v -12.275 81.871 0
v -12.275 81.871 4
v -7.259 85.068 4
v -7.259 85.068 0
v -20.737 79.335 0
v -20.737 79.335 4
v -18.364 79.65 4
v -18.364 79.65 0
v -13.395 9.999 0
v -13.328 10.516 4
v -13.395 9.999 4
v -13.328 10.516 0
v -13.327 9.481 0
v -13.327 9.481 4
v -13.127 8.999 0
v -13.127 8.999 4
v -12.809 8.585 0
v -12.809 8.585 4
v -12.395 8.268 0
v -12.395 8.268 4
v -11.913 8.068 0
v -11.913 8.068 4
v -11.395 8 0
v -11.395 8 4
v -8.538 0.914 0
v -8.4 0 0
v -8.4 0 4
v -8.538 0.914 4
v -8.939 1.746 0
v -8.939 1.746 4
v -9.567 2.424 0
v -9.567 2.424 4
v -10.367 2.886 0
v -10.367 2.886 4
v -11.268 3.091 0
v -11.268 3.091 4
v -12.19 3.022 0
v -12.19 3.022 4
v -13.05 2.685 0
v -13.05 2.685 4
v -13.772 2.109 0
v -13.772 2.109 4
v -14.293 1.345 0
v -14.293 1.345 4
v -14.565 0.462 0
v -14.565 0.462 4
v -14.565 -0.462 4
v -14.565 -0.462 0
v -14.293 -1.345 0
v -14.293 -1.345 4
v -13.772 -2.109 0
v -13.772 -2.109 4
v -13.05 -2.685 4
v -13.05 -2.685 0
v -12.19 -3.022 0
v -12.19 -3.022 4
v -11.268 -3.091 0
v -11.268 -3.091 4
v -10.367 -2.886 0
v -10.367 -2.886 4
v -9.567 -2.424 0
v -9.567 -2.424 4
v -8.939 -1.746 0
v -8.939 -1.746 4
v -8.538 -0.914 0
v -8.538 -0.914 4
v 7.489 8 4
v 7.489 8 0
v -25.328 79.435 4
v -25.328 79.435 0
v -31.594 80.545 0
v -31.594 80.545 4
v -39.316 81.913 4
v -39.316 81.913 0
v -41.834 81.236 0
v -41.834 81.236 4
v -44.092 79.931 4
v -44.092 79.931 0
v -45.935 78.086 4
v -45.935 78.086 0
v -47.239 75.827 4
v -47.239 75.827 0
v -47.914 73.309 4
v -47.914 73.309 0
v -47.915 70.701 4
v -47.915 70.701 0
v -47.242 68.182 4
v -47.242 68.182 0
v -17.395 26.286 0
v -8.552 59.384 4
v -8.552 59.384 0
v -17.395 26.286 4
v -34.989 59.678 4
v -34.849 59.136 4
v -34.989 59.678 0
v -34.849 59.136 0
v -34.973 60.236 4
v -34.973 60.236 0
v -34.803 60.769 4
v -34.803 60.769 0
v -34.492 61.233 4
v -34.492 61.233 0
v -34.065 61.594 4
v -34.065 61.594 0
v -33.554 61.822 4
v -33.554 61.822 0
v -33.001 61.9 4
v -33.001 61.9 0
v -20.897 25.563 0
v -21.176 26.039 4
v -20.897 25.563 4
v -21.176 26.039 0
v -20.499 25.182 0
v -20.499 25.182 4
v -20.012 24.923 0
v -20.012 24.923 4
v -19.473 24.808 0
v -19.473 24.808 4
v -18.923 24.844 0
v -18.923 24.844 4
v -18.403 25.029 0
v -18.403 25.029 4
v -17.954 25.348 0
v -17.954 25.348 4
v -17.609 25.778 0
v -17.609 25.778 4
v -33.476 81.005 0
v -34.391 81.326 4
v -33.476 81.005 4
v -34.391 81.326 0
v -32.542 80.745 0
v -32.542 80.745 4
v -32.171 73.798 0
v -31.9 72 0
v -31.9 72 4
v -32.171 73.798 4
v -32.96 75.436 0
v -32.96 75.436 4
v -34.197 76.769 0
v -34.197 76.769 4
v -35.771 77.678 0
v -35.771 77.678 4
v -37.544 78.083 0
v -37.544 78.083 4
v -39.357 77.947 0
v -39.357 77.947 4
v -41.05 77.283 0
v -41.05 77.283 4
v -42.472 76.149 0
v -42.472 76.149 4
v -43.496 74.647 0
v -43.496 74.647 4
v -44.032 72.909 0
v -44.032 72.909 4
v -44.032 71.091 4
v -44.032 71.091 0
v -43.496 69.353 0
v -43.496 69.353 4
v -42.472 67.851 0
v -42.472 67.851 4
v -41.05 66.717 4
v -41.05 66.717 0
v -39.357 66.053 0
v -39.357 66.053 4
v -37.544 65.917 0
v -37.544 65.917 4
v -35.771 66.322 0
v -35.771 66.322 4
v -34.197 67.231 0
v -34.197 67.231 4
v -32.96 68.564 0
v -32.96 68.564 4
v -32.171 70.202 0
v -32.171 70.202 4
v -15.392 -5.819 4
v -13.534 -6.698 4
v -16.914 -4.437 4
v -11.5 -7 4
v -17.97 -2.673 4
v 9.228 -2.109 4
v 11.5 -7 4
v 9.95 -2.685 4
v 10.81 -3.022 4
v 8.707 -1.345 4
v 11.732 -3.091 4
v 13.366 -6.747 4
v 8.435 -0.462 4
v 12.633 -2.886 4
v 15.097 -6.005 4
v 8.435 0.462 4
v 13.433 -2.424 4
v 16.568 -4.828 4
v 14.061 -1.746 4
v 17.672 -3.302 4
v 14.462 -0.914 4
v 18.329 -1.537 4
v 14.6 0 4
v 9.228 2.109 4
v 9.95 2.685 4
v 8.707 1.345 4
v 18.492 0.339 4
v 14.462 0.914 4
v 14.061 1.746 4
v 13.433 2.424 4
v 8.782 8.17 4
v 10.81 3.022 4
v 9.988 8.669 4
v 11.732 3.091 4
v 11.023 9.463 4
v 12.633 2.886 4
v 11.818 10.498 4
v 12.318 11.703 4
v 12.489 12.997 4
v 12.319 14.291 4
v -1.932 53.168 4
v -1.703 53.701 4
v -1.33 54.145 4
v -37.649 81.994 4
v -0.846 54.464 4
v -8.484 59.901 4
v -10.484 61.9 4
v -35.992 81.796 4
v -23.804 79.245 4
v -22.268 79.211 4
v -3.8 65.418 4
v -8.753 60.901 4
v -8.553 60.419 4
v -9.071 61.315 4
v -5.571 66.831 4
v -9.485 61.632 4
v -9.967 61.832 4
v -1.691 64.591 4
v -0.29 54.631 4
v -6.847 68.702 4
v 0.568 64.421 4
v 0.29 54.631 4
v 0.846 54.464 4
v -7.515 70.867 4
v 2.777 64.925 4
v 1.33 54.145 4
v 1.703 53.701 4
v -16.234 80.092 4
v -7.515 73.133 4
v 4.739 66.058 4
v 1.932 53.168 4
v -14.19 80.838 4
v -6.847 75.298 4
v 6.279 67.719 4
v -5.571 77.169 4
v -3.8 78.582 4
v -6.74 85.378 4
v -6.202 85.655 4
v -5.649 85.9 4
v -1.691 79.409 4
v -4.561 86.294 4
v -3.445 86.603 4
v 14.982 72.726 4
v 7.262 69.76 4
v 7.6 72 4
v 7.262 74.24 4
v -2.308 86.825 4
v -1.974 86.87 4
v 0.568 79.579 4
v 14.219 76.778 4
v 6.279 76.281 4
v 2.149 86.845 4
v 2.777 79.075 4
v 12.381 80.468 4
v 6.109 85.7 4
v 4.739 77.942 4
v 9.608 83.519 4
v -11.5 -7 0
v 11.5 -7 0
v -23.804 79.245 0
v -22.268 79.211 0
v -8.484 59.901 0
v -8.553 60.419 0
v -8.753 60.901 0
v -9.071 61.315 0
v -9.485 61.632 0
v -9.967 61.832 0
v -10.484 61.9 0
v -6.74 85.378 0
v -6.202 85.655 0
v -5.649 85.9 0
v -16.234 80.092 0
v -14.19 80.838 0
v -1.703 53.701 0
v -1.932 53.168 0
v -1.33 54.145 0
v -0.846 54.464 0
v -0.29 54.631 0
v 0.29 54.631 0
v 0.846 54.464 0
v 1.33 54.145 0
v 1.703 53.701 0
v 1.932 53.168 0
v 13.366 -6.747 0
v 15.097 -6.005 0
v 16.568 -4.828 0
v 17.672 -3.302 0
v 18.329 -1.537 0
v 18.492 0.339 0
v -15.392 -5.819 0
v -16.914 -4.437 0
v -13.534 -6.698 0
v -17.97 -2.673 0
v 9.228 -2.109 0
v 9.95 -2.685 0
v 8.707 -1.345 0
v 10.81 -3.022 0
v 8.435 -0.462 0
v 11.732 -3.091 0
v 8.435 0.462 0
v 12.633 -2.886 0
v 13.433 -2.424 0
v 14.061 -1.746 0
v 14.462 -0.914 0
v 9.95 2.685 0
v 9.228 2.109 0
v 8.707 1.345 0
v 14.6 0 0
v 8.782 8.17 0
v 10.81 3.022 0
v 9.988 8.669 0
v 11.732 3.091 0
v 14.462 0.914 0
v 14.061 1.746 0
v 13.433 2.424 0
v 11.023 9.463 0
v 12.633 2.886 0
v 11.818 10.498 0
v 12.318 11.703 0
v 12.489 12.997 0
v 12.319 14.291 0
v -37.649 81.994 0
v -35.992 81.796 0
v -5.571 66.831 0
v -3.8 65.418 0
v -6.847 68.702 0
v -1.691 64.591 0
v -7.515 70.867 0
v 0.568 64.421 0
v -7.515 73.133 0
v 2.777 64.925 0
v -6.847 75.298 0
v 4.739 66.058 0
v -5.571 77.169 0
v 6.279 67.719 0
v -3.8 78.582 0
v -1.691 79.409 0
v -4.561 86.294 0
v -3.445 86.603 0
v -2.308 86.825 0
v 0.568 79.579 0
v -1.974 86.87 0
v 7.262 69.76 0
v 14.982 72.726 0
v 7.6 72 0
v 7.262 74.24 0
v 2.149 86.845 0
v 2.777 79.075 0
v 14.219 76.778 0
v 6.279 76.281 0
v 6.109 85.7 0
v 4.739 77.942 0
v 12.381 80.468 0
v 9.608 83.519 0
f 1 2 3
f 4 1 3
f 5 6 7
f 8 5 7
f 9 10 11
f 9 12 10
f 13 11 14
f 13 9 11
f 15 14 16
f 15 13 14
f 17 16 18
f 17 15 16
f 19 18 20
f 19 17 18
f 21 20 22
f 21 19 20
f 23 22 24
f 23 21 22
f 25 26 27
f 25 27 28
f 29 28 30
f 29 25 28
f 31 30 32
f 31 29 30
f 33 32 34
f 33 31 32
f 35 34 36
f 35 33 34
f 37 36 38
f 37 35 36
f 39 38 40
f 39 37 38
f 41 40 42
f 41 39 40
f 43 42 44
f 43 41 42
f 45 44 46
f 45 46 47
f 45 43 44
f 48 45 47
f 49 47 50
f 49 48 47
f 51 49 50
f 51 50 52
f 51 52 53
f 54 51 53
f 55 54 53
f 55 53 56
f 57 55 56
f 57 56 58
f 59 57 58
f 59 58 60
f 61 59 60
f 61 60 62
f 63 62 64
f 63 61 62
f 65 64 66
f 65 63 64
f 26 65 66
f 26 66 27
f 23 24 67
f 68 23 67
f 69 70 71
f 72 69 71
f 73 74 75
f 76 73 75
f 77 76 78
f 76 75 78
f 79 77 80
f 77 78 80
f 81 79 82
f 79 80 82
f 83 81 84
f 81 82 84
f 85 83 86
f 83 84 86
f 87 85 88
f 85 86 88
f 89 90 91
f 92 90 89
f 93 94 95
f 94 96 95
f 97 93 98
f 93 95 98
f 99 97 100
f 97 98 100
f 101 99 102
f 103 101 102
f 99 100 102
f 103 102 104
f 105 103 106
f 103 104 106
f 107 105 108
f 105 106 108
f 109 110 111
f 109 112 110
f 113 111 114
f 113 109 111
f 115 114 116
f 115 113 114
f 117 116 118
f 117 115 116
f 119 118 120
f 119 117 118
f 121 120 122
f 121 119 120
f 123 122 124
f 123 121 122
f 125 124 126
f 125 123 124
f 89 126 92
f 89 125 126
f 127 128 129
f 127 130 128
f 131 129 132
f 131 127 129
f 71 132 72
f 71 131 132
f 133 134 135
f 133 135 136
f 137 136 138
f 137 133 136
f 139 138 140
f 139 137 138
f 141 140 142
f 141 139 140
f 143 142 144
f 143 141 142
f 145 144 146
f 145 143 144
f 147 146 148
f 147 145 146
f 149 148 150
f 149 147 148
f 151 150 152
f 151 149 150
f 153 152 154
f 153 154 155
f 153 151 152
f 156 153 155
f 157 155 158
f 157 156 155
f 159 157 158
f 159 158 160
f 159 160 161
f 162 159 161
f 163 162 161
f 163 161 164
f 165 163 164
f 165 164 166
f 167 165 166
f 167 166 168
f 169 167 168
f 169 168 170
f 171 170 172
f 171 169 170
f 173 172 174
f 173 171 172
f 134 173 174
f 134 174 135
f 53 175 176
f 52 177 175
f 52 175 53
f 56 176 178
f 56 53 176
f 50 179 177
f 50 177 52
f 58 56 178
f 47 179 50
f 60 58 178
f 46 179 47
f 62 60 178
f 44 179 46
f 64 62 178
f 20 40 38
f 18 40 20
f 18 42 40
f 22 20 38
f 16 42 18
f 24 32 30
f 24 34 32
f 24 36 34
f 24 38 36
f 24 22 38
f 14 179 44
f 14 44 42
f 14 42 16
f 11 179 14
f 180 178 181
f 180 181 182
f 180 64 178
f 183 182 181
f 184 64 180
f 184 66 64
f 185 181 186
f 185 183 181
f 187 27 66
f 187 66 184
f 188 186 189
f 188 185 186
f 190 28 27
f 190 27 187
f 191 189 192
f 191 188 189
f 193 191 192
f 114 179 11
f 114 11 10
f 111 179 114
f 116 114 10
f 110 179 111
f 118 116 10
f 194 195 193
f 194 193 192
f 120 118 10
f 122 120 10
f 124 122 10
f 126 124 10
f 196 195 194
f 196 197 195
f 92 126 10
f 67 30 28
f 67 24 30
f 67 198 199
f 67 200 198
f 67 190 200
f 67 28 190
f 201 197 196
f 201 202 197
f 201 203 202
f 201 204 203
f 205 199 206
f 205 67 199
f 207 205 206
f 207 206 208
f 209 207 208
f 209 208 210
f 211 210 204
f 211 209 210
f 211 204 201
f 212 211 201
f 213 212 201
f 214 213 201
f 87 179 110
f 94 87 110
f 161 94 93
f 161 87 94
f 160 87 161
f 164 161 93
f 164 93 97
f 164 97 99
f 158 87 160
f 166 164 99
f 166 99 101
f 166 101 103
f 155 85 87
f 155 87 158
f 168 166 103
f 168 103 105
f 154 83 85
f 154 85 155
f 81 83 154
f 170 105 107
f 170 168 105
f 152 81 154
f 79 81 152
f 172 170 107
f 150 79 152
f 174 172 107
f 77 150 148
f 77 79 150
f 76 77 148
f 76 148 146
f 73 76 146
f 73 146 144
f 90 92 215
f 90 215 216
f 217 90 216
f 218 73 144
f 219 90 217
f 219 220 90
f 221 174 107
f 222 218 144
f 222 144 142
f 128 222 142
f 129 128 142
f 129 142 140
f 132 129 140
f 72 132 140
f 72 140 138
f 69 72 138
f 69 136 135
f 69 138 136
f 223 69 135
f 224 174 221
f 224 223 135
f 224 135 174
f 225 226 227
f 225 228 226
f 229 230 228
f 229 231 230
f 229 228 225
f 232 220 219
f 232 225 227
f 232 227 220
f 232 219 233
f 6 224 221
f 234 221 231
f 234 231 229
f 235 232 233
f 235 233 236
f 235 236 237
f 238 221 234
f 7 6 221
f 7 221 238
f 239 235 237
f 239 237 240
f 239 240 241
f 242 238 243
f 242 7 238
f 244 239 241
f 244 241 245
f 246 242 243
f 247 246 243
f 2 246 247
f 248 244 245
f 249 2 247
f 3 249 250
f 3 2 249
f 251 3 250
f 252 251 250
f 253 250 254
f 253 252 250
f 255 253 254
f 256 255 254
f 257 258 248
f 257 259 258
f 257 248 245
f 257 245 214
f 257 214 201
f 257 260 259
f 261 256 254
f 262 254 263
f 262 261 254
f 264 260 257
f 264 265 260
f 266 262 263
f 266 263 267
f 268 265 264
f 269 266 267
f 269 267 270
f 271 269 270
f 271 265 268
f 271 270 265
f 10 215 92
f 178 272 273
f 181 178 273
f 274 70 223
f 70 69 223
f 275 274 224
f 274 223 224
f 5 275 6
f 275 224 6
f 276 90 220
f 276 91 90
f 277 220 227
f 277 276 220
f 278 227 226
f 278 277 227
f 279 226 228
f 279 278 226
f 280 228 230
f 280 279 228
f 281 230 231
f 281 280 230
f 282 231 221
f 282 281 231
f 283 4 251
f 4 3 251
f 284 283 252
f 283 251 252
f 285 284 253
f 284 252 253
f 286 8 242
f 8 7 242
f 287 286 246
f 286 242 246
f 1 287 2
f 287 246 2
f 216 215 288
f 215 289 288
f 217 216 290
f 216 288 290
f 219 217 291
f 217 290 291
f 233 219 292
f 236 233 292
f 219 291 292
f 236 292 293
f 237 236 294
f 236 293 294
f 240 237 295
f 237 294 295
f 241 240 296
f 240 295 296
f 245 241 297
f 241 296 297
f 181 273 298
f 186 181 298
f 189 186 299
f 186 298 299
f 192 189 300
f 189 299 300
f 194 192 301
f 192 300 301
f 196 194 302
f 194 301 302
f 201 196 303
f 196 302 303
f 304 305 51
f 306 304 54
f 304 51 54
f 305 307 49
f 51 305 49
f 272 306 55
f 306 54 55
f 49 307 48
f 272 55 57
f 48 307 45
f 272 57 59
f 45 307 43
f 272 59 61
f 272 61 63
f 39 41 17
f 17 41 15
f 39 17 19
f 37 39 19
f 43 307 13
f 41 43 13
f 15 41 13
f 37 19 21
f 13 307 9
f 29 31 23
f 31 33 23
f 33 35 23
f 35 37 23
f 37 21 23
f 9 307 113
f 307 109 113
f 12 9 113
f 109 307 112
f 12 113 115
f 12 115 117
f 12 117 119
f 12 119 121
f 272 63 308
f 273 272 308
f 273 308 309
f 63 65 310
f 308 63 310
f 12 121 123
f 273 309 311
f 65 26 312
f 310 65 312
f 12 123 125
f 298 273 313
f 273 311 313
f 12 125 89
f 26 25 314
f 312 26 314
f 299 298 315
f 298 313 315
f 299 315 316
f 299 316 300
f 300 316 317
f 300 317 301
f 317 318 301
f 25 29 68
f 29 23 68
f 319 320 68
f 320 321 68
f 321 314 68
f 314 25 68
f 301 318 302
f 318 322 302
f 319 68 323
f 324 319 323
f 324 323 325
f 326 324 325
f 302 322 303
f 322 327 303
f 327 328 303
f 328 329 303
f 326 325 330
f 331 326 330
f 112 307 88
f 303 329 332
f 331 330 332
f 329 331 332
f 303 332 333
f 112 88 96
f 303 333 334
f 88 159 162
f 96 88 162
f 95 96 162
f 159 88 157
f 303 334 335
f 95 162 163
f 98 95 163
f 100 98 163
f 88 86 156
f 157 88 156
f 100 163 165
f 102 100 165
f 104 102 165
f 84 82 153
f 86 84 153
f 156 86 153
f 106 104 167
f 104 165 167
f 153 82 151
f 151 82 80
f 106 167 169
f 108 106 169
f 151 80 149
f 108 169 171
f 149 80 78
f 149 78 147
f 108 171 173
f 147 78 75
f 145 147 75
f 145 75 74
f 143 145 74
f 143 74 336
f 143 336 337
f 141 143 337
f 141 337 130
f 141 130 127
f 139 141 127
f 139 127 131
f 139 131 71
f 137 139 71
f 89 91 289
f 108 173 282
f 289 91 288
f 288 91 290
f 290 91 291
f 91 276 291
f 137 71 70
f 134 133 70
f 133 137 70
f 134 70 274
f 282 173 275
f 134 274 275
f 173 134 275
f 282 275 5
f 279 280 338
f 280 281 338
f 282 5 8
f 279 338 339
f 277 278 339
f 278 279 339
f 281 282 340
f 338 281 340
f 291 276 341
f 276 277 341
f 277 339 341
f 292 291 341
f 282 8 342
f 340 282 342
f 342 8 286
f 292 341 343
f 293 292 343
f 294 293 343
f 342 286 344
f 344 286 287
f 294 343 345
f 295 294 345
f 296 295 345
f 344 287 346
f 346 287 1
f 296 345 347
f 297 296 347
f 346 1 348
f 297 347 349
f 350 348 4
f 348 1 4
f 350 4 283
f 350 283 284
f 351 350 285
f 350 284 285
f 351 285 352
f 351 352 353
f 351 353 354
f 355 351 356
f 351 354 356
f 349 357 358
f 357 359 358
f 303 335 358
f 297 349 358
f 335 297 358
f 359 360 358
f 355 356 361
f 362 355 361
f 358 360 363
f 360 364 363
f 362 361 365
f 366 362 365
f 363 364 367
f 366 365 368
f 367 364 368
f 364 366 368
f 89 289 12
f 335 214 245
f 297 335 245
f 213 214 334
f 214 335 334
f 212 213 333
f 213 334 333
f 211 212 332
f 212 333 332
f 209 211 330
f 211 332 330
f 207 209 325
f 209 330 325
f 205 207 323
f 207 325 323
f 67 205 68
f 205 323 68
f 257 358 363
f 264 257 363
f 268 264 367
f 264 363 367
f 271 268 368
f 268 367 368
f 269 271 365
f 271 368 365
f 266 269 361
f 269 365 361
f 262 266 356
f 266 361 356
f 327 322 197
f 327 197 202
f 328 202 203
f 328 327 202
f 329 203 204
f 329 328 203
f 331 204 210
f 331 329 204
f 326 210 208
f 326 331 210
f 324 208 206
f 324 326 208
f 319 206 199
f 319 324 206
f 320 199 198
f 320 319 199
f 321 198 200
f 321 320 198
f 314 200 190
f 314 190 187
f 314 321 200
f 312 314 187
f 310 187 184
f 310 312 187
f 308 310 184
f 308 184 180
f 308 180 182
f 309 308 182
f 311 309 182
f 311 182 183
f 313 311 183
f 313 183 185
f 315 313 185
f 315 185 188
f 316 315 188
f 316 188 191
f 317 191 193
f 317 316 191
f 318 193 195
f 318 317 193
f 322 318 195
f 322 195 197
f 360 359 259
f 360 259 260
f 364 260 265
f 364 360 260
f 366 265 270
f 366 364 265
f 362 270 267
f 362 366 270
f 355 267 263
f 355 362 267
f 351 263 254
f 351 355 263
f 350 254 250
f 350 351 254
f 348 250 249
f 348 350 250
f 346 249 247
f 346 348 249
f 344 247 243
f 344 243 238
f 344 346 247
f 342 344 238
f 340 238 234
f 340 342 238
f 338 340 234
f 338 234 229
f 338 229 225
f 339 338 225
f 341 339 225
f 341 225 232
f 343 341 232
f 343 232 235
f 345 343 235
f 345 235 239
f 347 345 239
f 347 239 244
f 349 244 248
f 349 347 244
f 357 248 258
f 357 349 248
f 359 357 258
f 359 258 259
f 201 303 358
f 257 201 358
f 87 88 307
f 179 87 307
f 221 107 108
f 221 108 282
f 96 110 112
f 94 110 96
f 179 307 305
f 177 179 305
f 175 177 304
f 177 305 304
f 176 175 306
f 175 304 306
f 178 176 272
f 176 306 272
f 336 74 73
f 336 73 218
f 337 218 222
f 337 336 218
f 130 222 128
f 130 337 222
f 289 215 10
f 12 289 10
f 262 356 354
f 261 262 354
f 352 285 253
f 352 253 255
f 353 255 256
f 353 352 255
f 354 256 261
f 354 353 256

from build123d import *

# Parameters (mm, degrees)
SKETCH_1_R            = 3.1
SKETCH_1_R_2          = 7.6
SKETCH_1_R_3          = 6.1
EXTRUDE_1_DEPTH       = 4
CUT_EXTRUDE_1_DEPTH   = 4
FILLET_1_R            = 2
FILLET_2_R            = 5
CUT_EXTRUDE_START     = -10
CUT_EXTRUDE_2_DEPTH   = 10
CHAMFER_START         = -75.71880289
CHAMFER_2_OUTLINE_W   = 9.932436379
CHAMFER_2_OUTLINE_H   = 4
CHAMFER_2_DEPTH       = 0.082131492
CHAMFER_START_2       = -75.636671398
CHAMFER_2_2_OUTLINE_W = 9.932436379
CHAMFER_2_2_OUTLINE_H = 4
CHAMFER_2_2_DEPTH     = 1.179418361
FILLET_4_R            = 15
FILLET_5_R            = 10


with BuildPart() as part:
    # 草图1 → 凸台-拉伸1 (new body)
    with BuildSketch(Plane.XY):
        with BuildLine():
            Line((-47.242305659, 68.18165139), (-17.969613961, -2.672844027))
            ThreePointArc((-17.969613961, -2.672844027), (-15.391663642, -5.818501018), (-11.5, -7))
            Line((-11.5, -7), (11.5, -7))
            ThreePointArc((11.5, -7), (16.568173397, -4.828417796), (18.491788179, 0.338966167))
            Line((18.491788179, 0.338966167), (14.98240324, 72.726356073))
            ThreePointArc((14.98240324, 72.726356073), (9.608039696, 83.518922397), (-1.973684211, 86.869585423))
            Line((-1.973684211, 86.869585423), (-39.315789474, 81.913056948))
            ThreePointArc((-39.315789474, 81.913056948), (-46.660613019, 76.999378175), (-47.242305659, 68.18165139))
        make_face()
        with Locations((11.5, 0)):
            Circle(SKETCH_1_R, mode=Mode.SUBTRACT)
        with Locations((-11.5, 0)):
            Circle(SKETCH_1_R, mode=Mode.SUBTRACT)
        with Locations((0, 72)):
            Circle(SKETCH_1_R_2, mode=Mode.SUBTRACT)
        with Locations((-38, 72)):
            Circle(SKETCH_1_R_3, mode=Mode.SUBTRACT)
    extrude(amount=EXTRUDE_1_DEPTH)

    # 草图2 → 切除-拉伸1 (cut)
    with BuildSketch(Plane.XY.offset(4)):
        Polygon((0, 60.4), (-14, 8), (14, 8), align=None)
        Polygon((-35.991267369, 61.9), (-7.879846422, 61.9), (-18.919878801, 20.578735952), align=None)
    extrude(amount=-CUT_EXTRUDE_1_DEPTH, mode=Mode.SUBTRACT)

    # 圆角1
    fillet_1_edges = [part.edges().sort_by_distance(p)[0] for p in [
        (-18.919878801, 20.578735952, 2),
        (-35.991267369, 61.9, 2),
        (-7.879846422, 61.9, 2),
        (0, 60.4, 2),
        (-14, 8, 2),
    ]]
    fillet(fillet_1_edges, radius=FILLET_1_R)

    # 圆角2
    fillet_2_edges = [part.edges().sort_by_distance(p)[0] for p in [
        (14, 8, 2),
    ]]
    fillet(fillet_2_edges, radius=FILLET_2_R)

    # 草图3 → 切除-拉伸2 (cut)
    with BuildSketch(Plane.XY.offset(4).offset(CUT_EXTRUDE_START)):
        with BuildLine():
            Line((-30.07293559, 78.096035584), (-12.403974557, 80.441289229))
            ThreePointArc((-12.403974557, 80.441289229), (-8.018810771, 84.681191682), (-2.308312161, 86.825169261))
            Line((-2.308312161, 86.825169261), (-39.315789474, 81.913056948))
            ThreePointArc((-39.315789474, 81.913056948), (-34.182978636, 81.242853883), (-30.07293559, 78.096035584))
        make_face()
    extrude(amount=CUT_EXTRUDE_2_DEPTH, mode=Mode.SUBTRACT)

    # 倒角1
    # the kernel refuses this chamfer: 10 mm, written as the material it adds along each edge
    with BuildSketch(Plane(origin=(-30.07293559, 78.096035584, 0), x_dir=(0.9913056948335455, 0.13157894736842105, 0), z_dir=(0, 0, 1))) as chamfer_1_piece_1:
        with BuildLine():
            Line((7.475531418, -0.121000067), (-3.274957131, 3.290873048))
            Line((-3.274957131, 3.290873048), (-3.390288264, 3.127475588))
            ThreePointArc((-3.390288264, 3.127475588), (-1.542012582, 1.735773049), (-0.173205081, -0.1))
            Line((-0.173205081, -0.1), (0, -0.2))
            ThreePointArc((0, -0.2), (3.737765709, -0.2), (7.475531418, -0.321000067))
            Line((7.475531418, -0.321000067), (7.475531418, -0.121000067))
        make_face()
    extrude(amount=4)

    # 倒角2: read off the stored shape, not the designer's step
    # 倒角2 outline → 倒角2 (cut)
    with BuildSketch(Plane(origin=(0, 0, 0), x_dir=(0.8432639594677482, 0.5374996694536432, 0), z_dir=(0.5374996694536432, -0.8432639594677483, 0)).offset(CHAMFER_START)):
        with Locations((35.301502575, 2)):
            Rectangle(CHAMFER_2_OUTLINE_W, CHAMFER_2_OUTLINE_H)
    extrude(amount=CHAMFER_2_DEPTH, mode=Mode.SUBTRACT)

    # Chamfer 2 2 outline → Chamfer 2 2 (add)
    with BuildSketch(Plane(origin=(0, 0, 0), x_dir=(0.8432639594677482, 0.5374996694536432, 0), z_dir=(0.5374996694536432, -0.8432639594677483, 0)).offset(CHAMFER_START_2)):
        with Locations((35.301502575, 2)):
            Rectangle(CHAMFER_2_2_OUTLINE_W, CHAMFER_2_2_OUTLINE_H)
    extrude(amount=CHAMFER_2_2_DEPTH)

    # 圆角4
    fillet_4_edges = [part.edges().sort_by_distance(p)[0] for p in [
        (-23.040343668, 79.029492385, 2),
        (-33.358562851, 80.857599065, 2),
        (-15.074033853, 80.086884334, 2),
    ]]
    fillet(fillet_4_edges, radius=FILLET_4_R)

    # 圆角5
    fillet_5_edges = [part.edges().sort_by_distance(p)[0] for p in [
        (-6.698368225, 85.425565604, 2),
    ]]
    fillet(fillet_5_edges, radius=FILLET_5_R)


solid = part.part
